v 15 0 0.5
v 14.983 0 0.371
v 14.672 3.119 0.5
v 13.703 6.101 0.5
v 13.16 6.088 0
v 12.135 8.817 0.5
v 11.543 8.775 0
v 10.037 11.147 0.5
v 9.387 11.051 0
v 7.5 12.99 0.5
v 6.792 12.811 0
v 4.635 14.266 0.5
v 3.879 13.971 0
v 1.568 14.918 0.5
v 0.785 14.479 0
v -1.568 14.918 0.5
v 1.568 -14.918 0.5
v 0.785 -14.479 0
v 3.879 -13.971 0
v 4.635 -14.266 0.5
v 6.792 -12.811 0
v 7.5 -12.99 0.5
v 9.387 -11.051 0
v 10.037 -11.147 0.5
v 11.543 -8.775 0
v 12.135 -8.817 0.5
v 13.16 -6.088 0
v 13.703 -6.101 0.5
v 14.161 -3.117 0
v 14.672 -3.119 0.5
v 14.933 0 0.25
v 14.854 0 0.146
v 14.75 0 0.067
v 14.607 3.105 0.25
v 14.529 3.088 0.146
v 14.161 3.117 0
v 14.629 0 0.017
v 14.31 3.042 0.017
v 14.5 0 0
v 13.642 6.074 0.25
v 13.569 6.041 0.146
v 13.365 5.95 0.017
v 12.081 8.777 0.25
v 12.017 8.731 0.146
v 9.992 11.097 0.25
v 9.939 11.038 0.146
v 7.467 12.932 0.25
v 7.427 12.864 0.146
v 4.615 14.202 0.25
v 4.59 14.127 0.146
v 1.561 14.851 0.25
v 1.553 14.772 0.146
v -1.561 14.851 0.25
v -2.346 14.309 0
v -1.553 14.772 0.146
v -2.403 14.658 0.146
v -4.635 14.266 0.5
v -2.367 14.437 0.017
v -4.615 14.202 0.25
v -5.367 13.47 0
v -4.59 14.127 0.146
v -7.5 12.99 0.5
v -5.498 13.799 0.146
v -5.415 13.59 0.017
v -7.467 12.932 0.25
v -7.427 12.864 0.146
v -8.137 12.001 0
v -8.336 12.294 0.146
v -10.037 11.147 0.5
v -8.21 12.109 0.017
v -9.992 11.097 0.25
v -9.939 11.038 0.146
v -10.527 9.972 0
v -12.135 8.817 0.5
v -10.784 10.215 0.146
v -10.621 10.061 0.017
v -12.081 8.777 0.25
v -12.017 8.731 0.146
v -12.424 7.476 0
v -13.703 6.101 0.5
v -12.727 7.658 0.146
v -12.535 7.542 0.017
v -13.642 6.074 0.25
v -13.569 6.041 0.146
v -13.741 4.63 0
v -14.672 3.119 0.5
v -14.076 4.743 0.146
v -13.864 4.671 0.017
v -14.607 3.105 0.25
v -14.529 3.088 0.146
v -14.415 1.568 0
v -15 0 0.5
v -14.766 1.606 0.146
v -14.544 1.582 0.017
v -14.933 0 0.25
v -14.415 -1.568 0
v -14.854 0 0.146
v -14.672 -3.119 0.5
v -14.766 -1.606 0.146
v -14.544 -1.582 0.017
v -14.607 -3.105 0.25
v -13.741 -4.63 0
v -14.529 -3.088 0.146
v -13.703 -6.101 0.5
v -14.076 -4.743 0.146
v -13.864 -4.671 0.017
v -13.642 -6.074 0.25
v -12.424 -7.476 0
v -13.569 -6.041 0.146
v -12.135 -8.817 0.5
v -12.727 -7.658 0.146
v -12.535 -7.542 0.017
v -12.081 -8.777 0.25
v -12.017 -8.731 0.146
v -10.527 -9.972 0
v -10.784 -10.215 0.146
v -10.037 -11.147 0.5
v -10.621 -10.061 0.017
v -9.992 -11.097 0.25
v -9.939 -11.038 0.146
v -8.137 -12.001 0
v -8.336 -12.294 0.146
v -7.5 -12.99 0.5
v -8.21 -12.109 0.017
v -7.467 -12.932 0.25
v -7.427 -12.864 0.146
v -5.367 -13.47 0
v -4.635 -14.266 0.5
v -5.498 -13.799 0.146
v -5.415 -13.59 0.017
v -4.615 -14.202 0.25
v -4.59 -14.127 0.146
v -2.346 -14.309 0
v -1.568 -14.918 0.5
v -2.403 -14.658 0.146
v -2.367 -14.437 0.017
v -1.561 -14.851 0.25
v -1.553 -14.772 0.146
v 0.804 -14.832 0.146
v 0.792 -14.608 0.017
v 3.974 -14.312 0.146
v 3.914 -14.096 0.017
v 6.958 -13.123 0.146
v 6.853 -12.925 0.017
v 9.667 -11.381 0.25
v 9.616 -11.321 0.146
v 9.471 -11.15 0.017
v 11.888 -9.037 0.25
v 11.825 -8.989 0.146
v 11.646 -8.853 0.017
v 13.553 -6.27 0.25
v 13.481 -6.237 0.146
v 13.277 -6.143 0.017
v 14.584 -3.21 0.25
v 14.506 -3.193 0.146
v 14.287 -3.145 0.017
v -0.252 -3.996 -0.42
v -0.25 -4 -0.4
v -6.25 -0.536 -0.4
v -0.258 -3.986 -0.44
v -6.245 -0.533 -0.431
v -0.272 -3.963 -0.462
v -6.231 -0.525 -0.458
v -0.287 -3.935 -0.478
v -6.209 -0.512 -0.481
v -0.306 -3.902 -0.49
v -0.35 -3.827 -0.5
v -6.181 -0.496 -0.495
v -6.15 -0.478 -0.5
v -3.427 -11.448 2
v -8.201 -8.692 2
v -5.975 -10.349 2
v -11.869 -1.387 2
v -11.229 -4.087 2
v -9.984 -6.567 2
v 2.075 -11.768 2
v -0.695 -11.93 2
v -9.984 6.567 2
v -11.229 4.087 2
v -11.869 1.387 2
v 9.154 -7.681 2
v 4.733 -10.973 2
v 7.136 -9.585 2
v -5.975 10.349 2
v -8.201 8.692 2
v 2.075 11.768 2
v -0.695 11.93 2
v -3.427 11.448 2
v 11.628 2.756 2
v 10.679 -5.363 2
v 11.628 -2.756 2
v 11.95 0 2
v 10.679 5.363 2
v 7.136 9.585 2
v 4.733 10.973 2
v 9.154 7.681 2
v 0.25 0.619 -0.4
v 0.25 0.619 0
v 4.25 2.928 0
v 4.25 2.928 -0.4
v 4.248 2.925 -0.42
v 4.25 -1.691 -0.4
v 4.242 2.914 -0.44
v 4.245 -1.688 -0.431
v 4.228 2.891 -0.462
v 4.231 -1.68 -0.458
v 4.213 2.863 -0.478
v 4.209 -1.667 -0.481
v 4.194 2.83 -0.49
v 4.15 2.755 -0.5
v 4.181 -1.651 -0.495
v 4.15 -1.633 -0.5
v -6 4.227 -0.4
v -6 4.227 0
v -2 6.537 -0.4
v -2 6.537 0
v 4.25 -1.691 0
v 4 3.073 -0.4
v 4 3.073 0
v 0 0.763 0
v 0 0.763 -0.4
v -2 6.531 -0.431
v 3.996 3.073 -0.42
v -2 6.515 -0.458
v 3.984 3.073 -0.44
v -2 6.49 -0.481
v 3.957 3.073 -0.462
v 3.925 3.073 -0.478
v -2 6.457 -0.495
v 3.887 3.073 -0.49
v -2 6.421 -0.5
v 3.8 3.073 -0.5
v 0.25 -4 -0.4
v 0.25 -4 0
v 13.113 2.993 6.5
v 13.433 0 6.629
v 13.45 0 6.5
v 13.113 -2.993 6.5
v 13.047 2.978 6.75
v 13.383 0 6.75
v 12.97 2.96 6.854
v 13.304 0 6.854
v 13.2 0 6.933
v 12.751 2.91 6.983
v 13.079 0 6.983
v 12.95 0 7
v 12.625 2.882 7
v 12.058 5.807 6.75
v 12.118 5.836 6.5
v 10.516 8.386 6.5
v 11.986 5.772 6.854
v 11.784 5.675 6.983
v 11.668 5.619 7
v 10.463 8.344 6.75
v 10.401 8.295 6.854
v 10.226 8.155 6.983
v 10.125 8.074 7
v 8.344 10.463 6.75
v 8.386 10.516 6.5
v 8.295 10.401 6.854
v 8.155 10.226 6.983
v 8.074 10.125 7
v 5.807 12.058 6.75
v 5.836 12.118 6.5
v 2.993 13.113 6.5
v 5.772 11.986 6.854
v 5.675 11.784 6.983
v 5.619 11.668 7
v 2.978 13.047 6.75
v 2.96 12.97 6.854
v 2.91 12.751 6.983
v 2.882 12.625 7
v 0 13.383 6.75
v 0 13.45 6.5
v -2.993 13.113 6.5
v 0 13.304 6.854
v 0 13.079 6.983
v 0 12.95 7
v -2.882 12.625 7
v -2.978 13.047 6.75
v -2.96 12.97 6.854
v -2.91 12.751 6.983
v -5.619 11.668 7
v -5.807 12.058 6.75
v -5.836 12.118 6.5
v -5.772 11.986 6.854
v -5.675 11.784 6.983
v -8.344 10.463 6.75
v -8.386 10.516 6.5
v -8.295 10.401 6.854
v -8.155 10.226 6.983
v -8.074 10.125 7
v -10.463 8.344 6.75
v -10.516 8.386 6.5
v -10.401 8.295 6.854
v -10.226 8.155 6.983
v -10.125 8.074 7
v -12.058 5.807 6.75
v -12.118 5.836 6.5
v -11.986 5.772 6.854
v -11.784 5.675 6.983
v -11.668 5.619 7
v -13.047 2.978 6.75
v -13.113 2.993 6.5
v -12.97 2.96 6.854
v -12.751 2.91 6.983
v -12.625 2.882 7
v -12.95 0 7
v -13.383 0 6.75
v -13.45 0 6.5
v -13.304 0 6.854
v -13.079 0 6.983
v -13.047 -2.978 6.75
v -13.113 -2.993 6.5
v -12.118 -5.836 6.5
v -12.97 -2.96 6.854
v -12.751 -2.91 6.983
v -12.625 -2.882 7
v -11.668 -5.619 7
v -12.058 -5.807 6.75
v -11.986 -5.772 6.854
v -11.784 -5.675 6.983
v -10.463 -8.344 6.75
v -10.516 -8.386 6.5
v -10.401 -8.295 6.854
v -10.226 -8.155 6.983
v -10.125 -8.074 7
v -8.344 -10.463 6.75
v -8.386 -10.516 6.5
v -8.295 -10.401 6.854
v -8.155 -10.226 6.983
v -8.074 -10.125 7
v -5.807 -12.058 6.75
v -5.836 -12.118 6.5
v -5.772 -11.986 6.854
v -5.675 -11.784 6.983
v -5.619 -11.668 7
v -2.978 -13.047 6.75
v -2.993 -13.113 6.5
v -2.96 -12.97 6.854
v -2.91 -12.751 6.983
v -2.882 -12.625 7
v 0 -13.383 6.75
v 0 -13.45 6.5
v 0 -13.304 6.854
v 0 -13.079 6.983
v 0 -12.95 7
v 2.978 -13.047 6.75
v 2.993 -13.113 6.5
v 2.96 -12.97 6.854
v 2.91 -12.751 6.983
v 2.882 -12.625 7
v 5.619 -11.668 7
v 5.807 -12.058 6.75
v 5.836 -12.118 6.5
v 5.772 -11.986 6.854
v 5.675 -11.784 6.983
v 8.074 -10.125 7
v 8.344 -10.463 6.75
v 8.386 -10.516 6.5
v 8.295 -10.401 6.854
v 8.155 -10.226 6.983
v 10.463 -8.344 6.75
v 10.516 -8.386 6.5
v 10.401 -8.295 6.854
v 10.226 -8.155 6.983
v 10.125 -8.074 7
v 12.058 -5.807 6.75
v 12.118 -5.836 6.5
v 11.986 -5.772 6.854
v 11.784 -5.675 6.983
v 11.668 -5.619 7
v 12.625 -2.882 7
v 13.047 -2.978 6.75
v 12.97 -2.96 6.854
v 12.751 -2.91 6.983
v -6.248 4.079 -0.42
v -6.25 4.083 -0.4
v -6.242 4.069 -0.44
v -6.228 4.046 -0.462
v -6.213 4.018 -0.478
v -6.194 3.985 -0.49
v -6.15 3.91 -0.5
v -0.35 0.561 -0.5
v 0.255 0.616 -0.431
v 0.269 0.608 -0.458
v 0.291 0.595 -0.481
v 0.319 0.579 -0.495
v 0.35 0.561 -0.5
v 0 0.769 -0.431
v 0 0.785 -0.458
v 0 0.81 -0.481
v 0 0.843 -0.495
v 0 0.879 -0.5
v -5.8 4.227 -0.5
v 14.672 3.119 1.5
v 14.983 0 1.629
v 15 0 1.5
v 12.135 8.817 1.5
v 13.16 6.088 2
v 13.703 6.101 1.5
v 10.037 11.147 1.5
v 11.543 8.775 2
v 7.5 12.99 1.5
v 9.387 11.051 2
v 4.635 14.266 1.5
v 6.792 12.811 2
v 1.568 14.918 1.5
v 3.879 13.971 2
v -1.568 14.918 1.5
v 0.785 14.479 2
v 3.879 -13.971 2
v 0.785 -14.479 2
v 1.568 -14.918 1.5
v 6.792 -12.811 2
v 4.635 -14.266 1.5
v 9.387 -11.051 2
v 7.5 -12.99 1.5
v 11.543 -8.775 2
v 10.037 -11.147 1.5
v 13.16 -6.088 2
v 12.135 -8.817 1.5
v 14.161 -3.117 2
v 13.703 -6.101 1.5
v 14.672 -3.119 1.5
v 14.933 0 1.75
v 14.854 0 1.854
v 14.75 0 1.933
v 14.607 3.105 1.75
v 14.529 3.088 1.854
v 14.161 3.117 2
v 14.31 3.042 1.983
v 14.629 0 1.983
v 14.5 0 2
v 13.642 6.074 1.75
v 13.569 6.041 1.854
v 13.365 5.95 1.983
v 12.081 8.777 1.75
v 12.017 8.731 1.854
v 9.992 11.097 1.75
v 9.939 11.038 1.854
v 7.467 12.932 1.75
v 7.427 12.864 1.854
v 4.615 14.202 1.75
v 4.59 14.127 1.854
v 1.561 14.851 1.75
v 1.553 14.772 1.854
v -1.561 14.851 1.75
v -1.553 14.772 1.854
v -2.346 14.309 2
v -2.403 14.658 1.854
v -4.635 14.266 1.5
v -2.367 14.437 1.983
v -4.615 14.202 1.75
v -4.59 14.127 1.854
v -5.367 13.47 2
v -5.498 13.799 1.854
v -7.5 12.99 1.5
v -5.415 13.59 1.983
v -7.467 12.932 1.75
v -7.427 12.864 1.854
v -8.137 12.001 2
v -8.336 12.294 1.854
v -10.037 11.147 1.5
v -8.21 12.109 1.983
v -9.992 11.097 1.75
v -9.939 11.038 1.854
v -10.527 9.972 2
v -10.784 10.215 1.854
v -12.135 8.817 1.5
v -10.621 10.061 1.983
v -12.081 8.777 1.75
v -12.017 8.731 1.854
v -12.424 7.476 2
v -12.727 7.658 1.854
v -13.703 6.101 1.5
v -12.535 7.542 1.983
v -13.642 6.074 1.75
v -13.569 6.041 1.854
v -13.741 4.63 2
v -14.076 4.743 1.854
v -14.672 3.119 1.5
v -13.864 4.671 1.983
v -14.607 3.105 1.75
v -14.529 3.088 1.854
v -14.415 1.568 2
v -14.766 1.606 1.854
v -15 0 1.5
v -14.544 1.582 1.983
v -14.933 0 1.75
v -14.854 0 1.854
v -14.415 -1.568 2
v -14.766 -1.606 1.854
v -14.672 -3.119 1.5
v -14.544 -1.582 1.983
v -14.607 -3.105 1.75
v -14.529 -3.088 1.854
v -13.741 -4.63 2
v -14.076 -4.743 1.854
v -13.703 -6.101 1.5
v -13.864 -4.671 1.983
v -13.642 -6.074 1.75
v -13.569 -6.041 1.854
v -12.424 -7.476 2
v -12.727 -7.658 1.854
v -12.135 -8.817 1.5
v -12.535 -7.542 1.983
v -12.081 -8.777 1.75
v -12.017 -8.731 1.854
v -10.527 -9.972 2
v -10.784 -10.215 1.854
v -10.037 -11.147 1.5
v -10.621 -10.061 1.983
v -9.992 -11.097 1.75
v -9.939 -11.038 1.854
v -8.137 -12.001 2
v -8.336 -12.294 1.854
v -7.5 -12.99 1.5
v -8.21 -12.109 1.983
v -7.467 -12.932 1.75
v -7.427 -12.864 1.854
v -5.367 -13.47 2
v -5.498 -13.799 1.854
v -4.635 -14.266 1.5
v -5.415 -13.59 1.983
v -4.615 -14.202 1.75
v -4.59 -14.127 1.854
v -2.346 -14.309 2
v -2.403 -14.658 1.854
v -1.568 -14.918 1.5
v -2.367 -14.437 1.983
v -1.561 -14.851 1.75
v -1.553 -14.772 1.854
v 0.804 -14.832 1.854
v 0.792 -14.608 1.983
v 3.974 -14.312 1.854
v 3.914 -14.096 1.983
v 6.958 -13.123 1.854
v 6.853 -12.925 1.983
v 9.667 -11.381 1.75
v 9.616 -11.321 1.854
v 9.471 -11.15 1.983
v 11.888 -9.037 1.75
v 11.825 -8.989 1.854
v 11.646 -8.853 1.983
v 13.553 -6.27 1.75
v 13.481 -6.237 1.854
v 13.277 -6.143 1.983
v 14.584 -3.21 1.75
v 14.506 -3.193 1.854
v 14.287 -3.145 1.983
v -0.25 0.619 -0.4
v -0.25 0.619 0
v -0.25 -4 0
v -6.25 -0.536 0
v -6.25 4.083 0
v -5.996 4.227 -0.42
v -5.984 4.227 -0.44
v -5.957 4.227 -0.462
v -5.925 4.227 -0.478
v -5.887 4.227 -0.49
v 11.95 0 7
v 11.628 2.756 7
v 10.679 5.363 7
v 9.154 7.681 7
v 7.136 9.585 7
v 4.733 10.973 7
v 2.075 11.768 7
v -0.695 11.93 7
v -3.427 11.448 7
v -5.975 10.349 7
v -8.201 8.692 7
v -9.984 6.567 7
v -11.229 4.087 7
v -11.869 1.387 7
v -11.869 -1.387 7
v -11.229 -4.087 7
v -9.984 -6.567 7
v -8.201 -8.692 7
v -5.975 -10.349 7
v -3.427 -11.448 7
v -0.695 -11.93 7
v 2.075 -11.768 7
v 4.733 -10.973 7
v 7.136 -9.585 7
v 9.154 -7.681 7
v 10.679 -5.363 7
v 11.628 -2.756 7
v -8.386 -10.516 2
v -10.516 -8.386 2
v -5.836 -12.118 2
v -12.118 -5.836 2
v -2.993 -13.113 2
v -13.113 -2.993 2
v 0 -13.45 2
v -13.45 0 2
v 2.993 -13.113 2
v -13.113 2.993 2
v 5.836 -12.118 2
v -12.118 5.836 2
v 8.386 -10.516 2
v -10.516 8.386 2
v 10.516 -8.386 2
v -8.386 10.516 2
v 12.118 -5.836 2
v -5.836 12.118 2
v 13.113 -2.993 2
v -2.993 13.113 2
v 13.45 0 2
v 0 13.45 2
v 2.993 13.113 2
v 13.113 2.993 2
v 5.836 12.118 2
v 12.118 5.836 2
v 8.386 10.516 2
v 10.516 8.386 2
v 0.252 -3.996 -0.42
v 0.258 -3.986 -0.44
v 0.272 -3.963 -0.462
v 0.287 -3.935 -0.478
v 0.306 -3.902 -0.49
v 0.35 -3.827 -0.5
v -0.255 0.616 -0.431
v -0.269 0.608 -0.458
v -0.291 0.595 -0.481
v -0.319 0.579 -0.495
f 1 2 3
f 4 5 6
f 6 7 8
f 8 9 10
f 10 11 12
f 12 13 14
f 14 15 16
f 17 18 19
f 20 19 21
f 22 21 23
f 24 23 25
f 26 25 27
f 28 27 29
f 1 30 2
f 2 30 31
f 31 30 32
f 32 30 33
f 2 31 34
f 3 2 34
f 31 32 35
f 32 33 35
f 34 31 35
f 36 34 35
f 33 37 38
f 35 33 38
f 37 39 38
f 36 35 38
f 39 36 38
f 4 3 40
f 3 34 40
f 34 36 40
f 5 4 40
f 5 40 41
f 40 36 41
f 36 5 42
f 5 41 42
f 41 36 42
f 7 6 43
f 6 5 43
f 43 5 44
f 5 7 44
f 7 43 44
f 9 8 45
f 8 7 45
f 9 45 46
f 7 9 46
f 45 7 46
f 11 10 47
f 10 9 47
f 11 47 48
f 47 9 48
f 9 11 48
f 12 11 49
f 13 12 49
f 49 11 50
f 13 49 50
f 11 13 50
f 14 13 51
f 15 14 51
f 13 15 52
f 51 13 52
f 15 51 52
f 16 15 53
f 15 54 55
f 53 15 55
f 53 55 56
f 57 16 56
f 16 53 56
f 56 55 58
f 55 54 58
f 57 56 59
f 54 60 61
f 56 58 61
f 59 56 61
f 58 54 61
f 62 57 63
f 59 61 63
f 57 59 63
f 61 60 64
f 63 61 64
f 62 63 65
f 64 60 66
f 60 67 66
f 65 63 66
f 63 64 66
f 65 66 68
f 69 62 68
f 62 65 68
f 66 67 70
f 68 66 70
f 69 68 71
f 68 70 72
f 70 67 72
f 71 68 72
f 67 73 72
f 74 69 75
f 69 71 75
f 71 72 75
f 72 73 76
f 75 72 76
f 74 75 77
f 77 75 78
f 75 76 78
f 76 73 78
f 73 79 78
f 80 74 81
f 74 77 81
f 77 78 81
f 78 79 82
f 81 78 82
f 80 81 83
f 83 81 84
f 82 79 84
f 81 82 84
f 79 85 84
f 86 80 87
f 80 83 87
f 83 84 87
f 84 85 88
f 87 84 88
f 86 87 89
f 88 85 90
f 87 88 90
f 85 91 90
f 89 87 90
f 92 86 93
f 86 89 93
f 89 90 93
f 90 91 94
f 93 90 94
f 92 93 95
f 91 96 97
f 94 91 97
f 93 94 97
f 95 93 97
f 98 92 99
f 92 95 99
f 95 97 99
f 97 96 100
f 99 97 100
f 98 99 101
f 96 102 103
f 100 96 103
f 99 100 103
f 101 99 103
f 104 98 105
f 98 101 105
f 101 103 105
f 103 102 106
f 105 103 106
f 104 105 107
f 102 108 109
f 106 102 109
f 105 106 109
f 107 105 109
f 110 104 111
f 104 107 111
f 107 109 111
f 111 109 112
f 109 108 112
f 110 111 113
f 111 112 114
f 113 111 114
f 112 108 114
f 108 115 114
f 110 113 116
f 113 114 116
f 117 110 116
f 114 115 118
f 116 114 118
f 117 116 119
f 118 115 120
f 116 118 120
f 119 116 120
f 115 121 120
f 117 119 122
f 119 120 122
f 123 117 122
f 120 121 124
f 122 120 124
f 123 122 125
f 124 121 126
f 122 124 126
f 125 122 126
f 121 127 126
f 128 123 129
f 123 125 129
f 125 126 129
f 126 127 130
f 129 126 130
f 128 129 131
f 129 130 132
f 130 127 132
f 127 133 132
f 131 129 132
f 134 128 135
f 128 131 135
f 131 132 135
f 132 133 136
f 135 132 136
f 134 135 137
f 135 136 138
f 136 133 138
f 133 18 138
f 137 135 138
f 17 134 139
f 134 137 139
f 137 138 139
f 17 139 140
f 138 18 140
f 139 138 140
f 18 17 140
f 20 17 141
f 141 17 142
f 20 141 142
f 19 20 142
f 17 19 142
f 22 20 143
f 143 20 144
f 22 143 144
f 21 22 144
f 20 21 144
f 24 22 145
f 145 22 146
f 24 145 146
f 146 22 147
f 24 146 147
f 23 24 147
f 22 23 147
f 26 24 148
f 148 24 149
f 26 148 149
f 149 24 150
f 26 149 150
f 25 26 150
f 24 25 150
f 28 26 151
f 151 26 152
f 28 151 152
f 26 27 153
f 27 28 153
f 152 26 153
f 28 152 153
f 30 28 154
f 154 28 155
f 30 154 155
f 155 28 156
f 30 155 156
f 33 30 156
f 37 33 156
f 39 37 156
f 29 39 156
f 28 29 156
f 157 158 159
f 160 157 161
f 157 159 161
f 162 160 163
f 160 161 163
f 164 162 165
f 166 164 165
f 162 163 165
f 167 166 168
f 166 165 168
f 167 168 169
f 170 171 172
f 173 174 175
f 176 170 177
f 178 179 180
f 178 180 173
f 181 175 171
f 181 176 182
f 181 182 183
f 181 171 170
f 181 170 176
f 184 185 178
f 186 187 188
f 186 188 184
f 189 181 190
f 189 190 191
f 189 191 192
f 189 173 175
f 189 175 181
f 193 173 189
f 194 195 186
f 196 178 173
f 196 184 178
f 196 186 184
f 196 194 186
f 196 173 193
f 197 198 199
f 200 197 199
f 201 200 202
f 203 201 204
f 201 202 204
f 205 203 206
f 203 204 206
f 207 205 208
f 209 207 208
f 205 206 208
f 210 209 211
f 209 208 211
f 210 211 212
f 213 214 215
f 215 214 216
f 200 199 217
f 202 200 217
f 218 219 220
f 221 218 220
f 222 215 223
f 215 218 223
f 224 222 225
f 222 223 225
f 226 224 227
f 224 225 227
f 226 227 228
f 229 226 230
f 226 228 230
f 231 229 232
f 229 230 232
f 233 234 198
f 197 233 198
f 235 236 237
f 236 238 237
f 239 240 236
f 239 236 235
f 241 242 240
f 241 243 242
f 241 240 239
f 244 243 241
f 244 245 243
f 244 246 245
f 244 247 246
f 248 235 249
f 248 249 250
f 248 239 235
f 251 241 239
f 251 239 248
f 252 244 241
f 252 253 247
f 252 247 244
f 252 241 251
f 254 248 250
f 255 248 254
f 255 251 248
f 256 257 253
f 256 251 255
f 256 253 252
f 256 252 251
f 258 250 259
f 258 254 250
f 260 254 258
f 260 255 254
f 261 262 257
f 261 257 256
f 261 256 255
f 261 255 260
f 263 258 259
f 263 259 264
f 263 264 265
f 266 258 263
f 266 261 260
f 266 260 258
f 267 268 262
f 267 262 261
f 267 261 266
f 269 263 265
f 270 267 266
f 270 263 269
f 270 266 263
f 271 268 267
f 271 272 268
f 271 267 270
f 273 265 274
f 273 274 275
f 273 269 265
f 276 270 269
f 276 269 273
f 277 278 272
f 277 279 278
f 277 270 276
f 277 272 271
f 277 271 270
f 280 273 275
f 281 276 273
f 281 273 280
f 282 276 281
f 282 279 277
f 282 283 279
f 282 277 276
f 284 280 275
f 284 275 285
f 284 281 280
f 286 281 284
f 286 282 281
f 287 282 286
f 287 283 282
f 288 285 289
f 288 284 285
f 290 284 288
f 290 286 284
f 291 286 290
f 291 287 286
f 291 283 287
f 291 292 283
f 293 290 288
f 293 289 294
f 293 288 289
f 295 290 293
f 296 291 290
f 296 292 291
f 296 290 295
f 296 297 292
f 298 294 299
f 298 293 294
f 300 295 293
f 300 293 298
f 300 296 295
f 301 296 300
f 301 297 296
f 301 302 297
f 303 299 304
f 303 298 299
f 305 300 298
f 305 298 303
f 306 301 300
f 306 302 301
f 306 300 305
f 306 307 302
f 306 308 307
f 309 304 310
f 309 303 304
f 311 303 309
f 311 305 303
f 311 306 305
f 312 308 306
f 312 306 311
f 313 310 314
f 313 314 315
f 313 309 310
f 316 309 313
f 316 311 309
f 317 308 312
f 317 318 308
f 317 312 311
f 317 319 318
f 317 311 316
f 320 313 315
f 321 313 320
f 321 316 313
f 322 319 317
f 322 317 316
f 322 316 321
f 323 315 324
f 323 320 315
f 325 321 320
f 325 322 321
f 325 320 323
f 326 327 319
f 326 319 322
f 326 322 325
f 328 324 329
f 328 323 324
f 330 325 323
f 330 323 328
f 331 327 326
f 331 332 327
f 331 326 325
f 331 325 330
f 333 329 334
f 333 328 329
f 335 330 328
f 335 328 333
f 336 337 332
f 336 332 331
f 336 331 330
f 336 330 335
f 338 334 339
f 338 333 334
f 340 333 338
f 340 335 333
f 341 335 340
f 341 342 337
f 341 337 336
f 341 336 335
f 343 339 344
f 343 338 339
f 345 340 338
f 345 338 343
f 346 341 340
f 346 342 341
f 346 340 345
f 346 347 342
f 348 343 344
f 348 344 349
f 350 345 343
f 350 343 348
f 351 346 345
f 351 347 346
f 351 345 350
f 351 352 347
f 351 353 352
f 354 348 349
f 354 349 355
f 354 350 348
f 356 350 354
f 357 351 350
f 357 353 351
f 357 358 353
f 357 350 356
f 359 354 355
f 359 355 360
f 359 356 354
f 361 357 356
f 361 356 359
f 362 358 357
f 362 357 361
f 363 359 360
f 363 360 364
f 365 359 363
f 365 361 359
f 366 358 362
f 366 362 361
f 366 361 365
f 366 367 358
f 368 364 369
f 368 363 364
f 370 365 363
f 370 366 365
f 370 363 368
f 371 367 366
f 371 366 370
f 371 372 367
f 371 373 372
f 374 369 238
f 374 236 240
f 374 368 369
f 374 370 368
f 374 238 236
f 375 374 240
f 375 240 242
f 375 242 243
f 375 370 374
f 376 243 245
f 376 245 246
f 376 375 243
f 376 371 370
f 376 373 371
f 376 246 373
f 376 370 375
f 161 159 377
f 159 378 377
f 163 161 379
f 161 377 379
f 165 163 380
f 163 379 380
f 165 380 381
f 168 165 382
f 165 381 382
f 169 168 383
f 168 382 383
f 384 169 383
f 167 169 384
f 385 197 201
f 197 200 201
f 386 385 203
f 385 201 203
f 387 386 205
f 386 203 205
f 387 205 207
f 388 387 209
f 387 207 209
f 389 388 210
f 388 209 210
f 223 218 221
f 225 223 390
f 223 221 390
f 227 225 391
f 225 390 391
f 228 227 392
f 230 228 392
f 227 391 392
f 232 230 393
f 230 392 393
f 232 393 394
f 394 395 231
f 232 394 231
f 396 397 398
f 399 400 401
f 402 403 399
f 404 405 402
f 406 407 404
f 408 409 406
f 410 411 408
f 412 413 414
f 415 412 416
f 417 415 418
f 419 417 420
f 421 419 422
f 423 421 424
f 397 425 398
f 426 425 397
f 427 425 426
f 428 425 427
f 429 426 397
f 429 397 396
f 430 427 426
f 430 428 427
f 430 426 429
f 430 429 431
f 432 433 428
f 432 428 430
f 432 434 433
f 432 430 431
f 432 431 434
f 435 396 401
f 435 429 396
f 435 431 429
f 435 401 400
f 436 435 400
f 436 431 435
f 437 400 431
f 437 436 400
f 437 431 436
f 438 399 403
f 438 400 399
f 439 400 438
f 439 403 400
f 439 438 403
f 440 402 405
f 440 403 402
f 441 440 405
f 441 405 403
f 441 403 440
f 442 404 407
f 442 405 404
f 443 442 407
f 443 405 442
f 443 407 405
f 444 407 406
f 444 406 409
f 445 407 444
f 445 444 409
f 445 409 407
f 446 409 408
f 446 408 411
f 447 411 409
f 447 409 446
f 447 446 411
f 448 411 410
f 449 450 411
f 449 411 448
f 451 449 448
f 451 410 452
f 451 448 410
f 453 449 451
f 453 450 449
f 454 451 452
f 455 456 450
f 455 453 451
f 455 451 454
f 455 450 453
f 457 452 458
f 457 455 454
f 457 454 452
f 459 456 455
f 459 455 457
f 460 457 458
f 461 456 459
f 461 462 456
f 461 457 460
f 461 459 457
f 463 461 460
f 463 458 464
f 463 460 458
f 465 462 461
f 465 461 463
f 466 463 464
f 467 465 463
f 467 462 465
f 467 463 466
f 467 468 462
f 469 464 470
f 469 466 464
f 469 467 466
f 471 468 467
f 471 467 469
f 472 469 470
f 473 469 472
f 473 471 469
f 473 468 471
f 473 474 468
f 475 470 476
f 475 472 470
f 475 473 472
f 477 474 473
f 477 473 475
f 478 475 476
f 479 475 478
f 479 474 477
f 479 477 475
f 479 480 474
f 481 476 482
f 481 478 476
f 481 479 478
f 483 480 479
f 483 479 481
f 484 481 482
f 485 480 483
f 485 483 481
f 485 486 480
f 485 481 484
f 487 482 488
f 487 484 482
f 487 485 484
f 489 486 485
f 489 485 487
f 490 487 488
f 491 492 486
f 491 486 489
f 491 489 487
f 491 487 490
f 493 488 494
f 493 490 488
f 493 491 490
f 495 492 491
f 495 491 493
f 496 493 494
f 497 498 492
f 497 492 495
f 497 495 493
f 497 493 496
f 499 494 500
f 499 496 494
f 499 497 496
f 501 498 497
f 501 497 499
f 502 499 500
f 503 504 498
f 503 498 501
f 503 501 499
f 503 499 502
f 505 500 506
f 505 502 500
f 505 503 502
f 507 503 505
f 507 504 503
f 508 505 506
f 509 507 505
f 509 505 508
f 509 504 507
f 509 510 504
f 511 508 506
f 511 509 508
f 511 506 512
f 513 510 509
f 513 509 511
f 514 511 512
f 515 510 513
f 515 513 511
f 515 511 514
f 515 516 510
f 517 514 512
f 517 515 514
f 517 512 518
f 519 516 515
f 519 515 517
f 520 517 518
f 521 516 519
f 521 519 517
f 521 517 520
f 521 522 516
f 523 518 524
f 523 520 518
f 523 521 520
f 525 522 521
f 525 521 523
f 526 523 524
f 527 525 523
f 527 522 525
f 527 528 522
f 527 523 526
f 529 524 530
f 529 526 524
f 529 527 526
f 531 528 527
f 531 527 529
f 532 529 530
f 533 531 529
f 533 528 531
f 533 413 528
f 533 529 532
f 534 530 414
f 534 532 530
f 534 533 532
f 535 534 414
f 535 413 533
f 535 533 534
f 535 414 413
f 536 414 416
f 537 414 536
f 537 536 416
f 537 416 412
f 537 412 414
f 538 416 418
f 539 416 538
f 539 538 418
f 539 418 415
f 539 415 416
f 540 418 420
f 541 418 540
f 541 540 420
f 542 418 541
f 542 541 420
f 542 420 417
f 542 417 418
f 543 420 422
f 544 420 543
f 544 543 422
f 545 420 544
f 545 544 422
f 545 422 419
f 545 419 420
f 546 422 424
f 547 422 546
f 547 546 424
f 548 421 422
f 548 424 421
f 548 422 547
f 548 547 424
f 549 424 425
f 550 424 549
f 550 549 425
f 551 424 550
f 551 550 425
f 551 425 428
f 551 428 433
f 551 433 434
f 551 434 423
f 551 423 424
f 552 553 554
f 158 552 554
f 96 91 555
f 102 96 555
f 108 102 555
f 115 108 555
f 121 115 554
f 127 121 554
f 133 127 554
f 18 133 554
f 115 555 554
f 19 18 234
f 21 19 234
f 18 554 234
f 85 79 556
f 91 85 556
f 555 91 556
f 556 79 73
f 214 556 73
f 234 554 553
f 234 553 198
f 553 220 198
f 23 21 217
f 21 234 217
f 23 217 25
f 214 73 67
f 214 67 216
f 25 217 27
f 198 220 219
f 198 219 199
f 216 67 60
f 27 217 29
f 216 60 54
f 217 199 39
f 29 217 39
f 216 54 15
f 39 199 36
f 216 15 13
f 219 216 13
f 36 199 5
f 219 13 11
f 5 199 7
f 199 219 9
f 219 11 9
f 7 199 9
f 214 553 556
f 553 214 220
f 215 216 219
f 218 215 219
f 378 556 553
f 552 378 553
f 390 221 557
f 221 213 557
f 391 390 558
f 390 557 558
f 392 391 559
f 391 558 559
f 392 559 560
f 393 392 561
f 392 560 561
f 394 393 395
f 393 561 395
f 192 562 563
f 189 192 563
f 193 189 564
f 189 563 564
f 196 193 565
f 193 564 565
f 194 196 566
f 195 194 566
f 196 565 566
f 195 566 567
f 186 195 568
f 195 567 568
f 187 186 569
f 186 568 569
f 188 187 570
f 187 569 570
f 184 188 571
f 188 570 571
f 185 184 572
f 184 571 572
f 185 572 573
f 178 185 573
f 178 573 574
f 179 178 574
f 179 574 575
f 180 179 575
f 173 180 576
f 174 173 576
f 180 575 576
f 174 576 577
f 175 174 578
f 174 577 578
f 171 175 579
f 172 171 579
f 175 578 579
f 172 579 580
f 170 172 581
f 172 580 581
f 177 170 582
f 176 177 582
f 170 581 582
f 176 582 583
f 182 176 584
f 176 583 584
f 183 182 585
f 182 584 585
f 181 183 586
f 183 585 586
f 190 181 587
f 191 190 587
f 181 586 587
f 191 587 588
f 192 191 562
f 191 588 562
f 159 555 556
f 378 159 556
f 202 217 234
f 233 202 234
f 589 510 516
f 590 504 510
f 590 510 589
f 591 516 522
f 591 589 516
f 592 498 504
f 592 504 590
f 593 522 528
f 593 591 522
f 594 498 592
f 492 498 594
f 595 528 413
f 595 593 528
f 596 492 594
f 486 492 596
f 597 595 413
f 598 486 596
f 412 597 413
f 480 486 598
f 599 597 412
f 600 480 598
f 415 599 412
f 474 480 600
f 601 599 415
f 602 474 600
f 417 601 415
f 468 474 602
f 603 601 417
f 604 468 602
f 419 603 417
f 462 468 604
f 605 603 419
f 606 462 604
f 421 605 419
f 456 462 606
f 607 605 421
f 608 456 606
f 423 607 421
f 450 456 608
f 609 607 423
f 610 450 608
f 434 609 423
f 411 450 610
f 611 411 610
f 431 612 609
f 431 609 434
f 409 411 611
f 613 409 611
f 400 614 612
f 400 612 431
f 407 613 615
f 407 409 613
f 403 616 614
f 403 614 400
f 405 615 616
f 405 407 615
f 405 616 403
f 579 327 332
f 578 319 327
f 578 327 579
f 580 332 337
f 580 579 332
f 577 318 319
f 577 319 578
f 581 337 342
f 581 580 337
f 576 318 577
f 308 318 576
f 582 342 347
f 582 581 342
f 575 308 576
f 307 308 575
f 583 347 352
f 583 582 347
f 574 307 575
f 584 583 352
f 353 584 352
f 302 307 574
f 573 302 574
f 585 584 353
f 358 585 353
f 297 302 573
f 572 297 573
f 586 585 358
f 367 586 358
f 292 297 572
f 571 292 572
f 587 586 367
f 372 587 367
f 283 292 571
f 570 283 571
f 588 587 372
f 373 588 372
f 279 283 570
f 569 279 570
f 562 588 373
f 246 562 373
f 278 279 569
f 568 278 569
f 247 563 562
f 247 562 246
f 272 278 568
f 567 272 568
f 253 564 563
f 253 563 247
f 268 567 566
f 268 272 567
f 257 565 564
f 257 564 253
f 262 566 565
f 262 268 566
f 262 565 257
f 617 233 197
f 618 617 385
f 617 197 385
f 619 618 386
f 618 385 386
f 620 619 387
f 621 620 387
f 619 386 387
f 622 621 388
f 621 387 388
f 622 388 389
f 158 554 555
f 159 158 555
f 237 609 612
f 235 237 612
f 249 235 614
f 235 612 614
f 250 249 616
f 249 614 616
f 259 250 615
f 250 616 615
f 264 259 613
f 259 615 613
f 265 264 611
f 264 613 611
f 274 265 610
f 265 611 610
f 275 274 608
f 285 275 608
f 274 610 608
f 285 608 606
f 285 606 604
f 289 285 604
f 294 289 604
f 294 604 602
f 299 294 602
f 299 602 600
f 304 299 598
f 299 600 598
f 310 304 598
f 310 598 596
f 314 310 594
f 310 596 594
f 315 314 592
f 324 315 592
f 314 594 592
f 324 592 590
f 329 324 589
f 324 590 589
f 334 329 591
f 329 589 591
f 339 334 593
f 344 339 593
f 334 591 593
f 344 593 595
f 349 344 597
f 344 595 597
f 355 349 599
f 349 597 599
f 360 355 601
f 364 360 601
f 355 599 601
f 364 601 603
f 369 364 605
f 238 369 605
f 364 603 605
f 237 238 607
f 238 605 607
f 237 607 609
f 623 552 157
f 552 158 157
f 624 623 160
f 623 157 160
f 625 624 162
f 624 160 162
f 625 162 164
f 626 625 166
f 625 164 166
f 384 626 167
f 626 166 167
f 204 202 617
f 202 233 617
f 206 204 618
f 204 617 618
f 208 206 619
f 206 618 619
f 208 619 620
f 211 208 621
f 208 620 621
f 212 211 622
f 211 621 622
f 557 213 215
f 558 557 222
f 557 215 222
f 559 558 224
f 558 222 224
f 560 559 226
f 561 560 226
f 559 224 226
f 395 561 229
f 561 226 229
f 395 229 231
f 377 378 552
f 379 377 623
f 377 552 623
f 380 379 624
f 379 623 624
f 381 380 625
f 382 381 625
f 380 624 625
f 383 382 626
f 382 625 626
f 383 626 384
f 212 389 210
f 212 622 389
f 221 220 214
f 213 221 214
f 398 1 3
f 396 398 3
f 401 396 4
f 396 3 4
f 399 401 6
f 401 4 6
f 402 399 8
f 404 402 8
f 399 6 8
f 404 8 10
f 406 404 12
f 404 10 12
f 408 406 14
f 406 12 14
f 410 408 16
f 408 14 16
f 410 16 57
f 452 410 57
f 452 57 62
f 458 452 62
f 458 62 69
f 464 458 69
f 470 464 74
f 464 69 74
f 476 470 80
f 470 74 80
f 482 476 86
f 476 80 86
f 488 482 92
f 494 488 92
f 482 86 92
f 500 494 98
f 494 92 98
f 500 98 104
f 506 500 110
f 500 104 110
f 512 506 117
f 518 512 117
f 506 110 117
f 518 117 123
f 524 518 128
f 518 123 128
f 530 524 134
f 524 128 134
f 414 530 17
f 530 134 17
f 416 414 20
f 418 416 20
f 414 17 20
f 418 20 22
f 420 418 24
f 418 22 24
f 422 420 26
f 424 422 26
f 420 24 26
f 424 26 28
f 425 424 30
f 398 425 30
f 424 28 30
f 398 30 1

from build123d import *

# Parameters (mm, degrees)
F0_R     = 15
F1_DEPTH = 2
F2_R     = 13.45
F3_DEPTH = 5
F4_R     = 0.5
F6_DEPTH = 0.5
F7_R     = 0.1
F8_R     = 11.95
F9_DEPTH = 5


with BuildPart() as f1:
    # F0 (on Top) → F1 (new body)
    with BuildSketch(Plane.XY):
        Circle(F0_R)
    extrude(amount=F1_DEPTH)

    # F2 (on face) → F3 (join)
    with BuildSketch(Plane.XY.offset(2)):
        Circle(F2_R)
    extrude(amount=F3_DEPTH)

    # F4
    f4_edges = [f1.edges().sort_by_distance(p)[0] for p in [
        (-15, 0, 2),
        (-13.45, 0, 7),
        (-15, 0, 0),
    ]]
    fillet(f4_edges, radius=F4_R)

    # F5 (on face) → F6 (join)
    with BuildSketch(Plane(origin=(0, 0, 0), x_dir=(1, 0, 0), z_dir=(0, 0, -1))):
        Polygon((-6.25, -4.082904), (-0.25, -0.618802), (-0.25, 4), (-6.25, 0.535898), align=None)
        Polygon((0.25, 4), (0.25, -0.618802), (4.25, -2.928203), (4.25, 1.690599), align=None)
        Polygon((4, -3.072541), (0, -0.76314), (-6, -4.227241), (-2, -6.536642), align=None)
    extrude(amount=F6_DEPTH)

    # F7
    f7_edges = [f1.edges().sort_by_distance(p)[0] for p in [
        (2.25, 1.773503, -0.5),
        (2.25, -2.845299, -0.5),
        (4.25, 0.618802, -0.5),
        (0.25, -1.690599, -0.5),
        (-0.25, -1.690599, -0.5),
        (-3, 2.495191, -0.5),
        (2, 1.91784, -0.5),
        (1, 4.804592, -0.5),
        (-4, 5.381942, -0.5),
        (-3.25, 2.350853, -0.5),
        (-6.25, 1.773503, -0.5),
        (-3.25, -2.267949, -0.5),
    ]]
    fillet(f7_edges, radius=F7_R)

    # F8 (on face) → F9 (cut)
    with BuildSketch(Plane.XY.offset(7)):
        Circle(F8_R)
    extrude(amount=-F9_DEPTH, mode=Mode.SUBTRACT)


solid = f1.part
